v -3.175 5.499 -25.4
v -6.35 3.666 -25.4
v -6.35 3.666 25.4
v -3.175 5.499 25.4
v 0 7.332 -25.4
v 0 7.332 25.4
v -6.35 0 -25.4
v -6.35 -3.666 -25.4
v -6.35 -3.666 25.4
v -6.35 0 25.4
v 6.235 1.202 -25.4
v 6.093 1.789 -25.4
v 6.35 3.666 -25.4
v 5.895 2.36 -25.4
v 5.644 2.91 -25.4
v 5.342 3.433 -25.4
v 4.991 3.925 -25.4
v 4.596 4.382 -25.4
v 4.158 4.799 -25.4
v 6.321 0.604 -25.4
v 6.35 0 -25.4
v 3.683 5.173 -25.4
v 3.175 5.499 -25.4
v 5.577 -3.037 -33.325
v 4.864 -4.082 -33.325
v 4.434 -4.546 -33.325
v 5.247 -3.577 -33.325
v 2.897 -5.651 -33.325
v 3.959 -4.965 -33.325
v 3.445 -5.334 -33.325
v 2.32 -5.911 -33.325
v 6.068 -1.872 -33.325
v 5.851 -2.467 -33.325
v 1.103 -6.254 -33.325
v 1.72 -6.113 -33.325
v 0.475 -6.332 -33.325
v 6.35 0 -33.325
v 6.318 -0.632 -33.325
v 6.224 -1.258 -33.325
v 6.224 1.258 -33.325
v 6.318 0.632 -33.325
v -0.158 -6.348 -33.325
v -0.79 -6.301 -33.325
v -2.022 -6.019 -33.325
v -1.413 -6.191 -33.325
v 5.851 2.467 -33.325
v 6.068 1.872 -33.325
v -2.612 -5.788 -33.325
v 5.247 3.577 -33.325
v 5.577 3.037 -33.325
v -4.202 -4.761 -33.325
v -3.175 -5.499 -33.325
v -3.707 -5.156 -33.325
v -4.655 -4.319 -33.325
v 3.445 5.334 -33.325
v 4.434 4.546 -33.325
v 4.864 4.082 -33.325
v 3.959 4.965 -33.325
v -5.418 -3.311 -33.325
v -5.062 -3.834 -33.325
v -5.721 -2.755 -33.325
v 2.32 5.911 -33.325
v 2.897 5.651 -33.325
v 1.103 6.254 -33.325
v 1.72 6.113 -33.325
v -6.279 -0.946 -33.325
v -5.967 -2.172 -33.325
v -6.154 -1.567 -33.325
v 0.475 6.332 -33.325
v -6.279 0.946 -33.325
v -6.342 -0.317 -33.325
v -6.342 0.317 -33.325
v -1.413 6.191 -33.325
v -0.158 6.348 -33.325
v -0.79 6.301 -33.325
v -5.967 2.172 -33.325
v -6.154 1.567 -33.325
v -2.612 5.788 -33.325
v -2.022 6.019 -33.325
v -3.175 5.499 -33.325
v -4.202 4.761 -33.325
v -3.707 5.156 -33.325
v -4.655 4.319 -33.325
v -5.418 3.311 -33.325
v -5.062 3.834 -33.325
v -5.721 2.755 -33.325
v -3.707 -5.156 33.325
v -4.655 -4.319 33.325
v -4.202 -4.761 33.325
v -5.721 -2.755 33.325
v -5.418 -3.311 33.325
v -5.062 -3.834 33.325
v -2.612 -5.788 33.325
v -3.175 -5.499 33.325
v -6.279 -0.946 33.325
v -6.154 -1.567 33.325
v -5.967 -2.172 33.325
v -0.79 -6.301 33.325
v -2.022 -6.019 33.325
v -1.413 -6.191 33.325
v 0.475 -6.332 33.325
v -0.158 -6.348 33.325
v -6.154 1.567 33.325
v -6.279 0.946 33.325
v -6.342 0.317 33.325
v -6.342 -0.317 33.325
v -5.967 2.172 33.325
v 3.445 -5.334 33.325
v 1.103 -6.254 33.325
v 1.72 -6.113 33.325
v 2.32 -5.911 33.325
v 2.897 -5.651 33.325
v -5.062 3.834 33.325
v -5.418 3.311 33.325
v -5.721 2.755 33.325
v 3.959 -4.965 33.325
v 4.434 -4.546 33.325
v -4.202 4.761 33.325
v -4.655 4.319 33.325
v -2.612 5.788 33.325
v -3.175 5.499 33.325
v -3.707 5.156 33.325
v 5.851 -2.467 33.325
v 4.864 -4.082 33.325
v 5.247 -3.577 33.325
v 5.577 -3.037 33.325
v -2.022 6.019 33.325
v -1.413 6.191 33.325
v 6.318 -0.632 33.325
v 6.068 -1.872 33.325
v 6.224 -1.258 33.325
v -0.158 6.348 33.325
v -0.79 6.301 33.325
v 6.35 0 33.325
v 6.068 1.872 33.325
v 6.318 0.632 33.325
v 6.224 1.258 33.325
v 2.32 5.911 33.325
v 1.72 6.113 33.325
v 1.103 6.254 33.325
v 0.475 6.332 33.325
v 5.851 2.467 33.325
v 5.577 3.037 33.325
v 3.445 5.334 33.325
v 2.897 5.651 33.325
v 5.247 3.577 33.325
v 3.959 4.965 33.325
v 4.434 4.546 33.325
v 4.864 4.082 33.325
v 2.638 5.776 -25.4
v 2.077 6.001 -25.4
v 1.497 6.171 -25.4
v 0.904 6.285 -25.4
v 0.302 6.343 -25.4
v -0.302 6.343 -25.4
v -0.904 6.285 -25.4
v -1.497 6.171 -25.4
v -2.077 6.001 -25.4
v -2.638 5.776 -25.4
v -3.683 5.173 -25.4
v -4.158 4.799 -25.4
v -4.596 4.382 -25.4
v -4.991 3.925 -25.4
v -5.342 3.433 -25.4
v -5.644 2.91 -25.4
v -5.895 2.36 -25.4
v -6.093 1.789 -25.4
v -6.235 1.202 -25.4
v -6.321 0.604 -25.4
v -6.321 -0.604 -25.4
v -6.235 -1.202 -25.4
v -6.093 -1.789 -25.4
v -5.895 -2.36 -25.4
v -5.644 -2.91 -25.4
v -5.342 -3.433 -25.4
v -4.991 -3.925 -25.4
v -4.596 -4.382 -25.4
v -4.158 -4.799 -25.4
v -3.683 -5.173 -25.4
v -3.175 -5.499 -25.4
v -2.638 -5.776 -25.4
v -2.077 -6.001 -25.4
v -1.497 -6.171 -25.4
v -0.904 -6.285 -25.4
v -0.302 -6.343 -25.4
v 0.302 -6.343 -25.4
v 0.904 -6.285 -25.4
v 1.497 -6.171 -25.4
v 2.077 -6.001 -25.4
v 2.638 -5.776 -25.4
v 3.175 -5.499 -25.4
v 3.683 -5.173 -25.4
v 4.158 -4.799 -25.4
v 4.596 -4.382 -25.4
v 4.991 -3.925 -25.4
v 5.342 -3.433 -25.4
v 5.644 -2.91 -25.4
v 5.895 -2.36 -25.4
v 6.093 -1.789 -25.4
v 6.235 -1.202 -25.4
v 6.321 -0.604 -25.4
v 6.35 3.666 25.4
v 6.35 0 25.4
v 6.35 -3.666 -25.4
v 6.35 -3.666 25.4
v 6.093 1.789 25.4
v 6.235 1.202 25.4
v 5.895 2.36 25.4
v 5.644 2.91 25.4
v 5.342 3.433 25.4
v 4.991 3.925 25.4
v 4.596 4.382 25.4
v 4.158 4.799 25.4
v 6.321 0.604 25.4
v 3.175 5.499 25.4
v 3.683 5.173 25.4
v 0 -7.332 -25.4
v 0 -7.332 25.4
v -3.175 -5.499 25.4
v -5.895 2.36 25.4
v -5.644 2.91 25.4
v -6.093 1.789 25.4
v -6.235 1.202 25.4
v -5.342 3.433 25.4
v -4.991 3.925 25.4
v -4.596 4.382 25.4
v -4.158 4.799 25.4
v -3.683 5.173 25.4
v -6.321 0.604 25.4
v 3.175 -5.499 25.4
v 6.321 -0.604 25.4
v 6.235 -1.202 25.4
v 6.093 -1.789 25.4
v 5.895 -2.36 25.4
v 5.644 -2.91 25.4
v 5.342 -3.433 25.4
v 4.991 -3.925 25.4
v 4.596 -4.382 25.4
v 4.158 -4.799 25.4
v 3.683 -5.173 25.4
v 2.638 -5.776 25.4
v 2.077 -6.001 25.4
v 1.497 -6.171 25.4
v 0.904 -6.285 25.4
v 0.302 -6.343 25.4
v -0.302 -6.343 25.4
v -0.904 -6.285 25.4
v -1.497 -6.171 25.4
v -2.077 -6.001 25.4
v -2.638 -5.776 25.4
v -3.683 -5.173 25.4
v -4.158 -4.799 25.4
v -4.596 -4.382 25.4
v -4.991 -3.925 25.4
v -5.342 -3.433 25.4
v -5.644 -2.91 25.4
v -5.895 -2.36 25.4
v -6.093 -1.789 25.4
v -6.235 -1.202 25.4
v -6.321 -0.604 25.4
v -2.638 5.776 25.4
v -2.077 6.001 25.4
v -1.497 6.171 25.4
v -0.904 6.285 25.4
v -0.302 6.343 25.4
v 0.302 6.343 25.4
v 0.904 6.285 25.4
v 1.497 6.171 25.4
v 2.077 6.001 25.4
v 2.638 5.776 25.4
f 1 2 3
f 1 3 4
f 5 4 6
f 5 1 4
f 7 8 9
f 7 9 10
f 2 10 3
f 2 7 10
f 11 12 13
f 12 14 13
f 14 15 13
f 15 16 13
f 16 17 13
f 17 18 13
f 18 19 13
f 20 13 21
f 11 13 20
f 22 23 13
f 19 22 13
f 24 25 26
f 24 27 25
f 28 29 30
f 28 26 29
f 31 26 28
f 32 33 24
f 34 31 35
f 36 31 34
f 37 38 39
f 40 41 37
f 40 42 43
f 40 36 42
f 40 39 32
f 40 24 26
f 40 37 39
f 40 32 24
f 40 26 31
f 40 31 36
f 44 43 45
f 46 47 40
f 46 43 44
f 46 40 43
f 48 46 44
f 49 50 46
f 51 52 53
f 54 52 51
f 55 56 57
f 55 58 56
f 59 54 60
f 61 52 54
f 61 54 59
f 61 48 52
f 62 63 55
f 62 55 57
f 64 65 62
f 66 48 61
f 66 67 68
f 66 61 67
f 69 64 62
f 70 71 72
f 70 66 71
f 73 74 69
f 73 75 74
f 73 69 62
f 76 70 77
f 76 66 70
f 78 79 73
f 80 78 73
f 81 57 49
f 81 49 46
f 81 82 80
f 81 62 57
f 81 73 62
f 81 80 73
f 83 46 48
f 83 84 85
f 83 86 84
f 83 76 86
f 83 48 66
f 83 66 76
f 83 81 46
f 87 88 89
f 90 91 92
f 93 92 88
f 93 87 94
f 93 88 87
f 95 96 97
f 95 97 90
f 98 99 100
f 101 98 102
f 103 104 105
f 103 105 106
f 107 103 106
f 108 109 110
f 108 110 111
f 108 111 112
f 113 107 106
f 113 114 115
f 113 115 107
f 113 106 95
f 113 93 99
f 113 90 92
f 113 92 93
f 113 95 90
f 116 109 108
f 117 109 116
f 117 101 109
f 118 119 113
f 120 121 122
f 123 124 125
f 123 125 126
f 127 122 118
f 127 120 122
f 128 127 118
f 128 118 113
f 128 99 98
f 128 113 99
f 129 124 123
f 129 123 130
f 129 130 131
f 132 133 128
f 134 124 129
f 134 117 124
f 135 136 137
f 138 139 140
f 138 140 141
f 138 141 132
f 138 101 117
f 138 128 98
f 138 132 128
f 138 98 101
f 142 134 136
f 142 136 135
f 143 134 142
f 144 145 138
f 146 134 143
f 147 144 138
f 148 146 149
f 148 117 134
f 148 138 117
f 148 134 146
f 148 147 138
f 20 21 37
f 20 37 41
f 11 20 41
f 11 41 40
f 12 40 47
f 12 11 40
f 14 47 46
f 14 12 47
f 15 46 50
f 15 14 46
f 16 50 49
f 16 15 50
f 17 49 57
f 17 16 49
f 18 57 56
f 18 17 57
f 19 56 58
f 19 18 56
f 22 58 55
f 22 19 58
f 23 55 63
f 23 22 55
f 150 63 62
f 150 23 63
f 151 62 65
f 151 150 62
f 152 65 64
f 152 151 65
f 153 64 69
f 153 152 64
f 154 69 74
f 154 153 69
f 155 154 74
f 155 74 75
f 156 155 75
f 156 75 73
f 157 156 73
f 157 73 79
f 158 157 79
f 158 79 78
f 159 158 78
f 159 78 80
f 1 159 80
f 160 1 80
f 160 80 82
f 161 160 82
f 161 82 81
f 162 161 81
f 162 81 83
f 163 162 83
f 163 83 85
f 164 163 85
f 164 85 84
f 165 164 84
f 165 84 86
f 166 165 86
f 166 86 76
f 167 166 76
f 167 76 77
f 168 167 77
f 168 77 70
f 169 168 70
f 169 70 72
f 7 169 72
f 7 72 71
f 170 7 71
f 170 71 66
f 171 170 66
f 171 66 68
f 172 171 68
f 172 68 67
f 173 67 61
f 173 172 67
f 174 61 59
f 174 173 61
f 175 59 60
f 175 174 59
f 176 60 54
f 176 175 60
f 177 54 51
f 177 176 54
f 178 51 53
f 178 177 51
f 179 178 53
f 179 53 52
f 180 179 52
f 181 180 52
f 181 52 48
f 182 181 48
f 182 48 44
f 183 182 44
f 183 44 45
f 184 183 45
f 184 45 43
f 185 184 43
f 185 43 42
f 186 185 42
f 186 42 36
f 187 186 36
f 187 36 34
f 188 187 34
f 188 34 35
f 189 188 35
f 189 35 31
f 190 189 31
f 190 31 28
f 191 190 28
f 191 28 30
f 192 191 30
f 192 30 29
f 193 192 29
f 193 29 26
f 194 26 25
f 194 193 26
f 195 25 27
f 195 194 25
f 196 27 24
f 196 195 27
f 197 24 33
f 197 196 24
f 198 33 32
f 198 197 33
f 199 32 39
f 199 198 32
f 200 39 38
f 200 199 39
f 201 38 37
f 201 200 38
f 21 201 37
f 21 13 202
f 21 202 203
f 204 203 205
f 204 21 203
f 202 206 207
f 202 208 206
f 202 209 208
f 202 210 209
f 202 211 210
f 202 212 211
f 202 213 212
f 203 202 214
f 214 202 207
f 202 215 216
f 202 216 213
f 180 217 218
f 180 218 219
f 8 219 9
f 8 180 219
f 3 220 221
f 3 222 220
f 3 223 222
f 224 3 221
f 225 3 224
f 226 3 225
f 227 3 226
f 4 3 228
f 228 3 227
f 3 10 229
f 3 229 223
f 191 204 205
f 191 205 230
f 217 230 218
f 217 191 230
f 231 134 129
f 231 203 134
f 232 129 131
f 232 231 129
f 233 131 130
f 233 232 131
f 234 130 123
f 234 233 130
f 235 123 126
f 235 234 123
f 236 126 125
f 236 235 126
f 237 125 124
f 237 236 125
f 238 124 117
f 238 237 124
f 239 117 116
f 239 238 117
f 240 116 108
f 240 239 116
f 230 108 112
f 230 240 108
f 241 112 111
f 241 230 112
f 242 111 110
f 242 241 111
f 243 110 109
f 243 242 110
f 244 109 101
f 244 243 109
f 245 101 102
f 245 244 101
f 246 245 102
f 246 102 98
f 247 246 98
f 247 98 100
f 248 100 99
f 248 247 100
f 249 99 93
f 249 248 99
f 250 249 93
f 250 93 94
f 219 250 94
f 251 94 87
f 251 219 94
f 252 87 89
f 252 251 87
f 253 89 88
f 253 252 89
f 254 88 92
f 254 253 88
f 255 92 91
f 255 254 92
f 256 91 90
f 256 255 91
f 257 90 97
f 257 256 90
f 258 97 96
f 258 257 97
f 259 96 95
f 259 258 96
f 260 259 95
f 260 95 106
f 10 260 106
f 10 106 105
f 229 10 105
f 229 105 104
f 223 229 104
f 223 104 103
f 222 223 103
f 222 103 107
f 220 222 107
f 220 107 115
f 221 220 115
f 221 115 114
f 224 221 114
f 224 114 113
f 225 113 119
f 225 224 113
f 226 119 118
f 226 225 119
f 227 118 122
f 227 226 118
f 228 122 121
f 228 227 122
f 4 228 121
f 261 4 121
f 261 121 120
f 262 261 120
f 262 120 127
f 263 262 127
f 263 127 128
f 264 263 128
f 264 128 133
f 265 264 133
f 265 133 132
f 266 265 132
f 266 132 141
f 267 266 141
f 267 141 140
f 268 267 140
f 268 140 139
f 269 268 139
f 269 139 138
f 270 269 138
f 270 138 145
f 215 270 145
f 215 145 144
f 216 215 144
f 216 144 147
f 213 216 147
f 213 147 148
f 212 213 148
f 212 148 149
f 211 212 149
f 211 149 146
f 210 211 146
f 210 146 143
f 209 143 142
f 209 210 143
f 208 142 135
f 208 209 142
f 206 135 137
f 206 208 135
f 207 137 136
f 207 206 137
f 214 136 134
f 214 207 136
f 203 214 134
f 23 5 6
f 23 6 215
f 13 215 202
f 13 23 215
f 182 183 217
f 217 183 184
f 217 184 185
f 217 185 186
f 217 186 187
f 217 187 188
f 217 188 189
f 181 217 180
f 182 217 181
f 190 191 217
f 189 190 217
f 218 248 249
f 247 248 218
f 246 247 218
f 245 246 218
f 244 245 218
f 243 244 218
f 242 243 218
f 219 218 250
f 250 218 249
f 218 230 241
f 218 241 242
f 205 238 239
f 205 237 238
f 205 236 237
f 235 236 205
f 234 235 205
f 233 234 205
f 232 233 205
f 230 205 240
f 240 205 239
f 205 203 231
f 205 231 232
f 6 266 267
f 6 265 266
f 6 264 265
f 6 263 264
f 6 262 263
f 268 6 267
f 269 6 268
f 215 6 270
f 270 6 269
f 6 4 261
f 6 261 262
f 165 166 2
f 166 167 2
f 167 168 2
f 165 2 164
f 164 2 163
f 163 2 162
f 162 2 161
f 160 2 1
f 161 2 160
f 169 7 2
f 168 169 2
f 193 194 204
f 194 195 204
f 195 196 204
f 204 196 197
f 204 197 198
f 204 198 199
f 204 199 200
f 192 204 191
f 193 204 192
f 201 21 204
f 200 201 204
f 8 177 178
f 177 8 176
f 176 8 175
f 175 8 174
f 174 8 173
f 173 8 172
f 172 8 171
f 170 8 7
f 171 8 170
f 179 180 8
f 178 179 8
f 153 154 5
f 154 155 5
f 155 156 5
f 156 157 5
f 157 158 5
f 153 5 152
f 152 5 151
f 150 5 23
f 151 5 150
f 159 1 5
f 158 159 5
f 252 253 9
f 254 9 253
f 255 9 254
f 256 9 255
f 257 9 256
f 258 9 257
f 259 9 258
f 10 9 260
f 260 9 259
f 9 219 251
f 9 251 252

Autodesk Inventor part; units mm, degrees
ref_plane "YZ Plane" through (0, 0, 0) normal (1, 0, 0) x (0, 1, 0)
ref_plane "XZ Plane" through (0, 0, 0) normal (0, 1, 0) x (-1, 0, 0)
ref_plane "XY Plane" through (0, 0, 0) normal (0, 0, 1) x (1, 0, 0)
sketch "Sketch1" plane through (0, 0, 0) normal (0, 0, 1) x (1, 0, 0)
  line L0 (-6.35, -3.6662) -> (-6.35, 3.6662)
  line L1 (-6.35, 3.6662) -> (0, 7.3323)
  line L2 (0, 7.3323) -> (6.35, 3.6662)
  line L3 (6.35, 3.6662) -> (6.35, -3.6662)
  line L4 (6.35, -3.6662) -> (0, -7.3323)
  line L5 (0, -7.3323) -> (-6.35, -3.6662)
  point P0 (0, 0)
  point P1 (0, 0)
  dimension "Size" = 12.7
extrude "Extrusion1" add sketch "Sketch1" along normal mid plane 50.8
sketch "Sketch2" plane through (0, 0, 25.4) normal (0, 0, 1) x (1, 0, 0)
  line L0 (-6.35, 3.6662) -> (-6.35, -3.6662) construction
  line L1 (-6.35, -3.6662) -> (0, -7.3323) construction
  line L2 (0, -7.3323) -> (6.35, -3.6662) construction
  line L3 (6.35, -3.6662) -> (6.35, 3.6662) construction
  line L4 (6.35, 3.6662) -> (0, 7.3323) construction
  line L5 (0, 7.3323) -> (-6.35, 3.6662) construction
  circle A0 centre (0, 0) radius 6.35
extrude "Extrusion2" add sketch "Sketch2" along normal blind 7.9248
mirror "Mirror1" about plane through (0, 0, 0) normal (0, 0, 1) of "Extrusion2"
properties part number "SHAFT" material "Aluminum 6061"
